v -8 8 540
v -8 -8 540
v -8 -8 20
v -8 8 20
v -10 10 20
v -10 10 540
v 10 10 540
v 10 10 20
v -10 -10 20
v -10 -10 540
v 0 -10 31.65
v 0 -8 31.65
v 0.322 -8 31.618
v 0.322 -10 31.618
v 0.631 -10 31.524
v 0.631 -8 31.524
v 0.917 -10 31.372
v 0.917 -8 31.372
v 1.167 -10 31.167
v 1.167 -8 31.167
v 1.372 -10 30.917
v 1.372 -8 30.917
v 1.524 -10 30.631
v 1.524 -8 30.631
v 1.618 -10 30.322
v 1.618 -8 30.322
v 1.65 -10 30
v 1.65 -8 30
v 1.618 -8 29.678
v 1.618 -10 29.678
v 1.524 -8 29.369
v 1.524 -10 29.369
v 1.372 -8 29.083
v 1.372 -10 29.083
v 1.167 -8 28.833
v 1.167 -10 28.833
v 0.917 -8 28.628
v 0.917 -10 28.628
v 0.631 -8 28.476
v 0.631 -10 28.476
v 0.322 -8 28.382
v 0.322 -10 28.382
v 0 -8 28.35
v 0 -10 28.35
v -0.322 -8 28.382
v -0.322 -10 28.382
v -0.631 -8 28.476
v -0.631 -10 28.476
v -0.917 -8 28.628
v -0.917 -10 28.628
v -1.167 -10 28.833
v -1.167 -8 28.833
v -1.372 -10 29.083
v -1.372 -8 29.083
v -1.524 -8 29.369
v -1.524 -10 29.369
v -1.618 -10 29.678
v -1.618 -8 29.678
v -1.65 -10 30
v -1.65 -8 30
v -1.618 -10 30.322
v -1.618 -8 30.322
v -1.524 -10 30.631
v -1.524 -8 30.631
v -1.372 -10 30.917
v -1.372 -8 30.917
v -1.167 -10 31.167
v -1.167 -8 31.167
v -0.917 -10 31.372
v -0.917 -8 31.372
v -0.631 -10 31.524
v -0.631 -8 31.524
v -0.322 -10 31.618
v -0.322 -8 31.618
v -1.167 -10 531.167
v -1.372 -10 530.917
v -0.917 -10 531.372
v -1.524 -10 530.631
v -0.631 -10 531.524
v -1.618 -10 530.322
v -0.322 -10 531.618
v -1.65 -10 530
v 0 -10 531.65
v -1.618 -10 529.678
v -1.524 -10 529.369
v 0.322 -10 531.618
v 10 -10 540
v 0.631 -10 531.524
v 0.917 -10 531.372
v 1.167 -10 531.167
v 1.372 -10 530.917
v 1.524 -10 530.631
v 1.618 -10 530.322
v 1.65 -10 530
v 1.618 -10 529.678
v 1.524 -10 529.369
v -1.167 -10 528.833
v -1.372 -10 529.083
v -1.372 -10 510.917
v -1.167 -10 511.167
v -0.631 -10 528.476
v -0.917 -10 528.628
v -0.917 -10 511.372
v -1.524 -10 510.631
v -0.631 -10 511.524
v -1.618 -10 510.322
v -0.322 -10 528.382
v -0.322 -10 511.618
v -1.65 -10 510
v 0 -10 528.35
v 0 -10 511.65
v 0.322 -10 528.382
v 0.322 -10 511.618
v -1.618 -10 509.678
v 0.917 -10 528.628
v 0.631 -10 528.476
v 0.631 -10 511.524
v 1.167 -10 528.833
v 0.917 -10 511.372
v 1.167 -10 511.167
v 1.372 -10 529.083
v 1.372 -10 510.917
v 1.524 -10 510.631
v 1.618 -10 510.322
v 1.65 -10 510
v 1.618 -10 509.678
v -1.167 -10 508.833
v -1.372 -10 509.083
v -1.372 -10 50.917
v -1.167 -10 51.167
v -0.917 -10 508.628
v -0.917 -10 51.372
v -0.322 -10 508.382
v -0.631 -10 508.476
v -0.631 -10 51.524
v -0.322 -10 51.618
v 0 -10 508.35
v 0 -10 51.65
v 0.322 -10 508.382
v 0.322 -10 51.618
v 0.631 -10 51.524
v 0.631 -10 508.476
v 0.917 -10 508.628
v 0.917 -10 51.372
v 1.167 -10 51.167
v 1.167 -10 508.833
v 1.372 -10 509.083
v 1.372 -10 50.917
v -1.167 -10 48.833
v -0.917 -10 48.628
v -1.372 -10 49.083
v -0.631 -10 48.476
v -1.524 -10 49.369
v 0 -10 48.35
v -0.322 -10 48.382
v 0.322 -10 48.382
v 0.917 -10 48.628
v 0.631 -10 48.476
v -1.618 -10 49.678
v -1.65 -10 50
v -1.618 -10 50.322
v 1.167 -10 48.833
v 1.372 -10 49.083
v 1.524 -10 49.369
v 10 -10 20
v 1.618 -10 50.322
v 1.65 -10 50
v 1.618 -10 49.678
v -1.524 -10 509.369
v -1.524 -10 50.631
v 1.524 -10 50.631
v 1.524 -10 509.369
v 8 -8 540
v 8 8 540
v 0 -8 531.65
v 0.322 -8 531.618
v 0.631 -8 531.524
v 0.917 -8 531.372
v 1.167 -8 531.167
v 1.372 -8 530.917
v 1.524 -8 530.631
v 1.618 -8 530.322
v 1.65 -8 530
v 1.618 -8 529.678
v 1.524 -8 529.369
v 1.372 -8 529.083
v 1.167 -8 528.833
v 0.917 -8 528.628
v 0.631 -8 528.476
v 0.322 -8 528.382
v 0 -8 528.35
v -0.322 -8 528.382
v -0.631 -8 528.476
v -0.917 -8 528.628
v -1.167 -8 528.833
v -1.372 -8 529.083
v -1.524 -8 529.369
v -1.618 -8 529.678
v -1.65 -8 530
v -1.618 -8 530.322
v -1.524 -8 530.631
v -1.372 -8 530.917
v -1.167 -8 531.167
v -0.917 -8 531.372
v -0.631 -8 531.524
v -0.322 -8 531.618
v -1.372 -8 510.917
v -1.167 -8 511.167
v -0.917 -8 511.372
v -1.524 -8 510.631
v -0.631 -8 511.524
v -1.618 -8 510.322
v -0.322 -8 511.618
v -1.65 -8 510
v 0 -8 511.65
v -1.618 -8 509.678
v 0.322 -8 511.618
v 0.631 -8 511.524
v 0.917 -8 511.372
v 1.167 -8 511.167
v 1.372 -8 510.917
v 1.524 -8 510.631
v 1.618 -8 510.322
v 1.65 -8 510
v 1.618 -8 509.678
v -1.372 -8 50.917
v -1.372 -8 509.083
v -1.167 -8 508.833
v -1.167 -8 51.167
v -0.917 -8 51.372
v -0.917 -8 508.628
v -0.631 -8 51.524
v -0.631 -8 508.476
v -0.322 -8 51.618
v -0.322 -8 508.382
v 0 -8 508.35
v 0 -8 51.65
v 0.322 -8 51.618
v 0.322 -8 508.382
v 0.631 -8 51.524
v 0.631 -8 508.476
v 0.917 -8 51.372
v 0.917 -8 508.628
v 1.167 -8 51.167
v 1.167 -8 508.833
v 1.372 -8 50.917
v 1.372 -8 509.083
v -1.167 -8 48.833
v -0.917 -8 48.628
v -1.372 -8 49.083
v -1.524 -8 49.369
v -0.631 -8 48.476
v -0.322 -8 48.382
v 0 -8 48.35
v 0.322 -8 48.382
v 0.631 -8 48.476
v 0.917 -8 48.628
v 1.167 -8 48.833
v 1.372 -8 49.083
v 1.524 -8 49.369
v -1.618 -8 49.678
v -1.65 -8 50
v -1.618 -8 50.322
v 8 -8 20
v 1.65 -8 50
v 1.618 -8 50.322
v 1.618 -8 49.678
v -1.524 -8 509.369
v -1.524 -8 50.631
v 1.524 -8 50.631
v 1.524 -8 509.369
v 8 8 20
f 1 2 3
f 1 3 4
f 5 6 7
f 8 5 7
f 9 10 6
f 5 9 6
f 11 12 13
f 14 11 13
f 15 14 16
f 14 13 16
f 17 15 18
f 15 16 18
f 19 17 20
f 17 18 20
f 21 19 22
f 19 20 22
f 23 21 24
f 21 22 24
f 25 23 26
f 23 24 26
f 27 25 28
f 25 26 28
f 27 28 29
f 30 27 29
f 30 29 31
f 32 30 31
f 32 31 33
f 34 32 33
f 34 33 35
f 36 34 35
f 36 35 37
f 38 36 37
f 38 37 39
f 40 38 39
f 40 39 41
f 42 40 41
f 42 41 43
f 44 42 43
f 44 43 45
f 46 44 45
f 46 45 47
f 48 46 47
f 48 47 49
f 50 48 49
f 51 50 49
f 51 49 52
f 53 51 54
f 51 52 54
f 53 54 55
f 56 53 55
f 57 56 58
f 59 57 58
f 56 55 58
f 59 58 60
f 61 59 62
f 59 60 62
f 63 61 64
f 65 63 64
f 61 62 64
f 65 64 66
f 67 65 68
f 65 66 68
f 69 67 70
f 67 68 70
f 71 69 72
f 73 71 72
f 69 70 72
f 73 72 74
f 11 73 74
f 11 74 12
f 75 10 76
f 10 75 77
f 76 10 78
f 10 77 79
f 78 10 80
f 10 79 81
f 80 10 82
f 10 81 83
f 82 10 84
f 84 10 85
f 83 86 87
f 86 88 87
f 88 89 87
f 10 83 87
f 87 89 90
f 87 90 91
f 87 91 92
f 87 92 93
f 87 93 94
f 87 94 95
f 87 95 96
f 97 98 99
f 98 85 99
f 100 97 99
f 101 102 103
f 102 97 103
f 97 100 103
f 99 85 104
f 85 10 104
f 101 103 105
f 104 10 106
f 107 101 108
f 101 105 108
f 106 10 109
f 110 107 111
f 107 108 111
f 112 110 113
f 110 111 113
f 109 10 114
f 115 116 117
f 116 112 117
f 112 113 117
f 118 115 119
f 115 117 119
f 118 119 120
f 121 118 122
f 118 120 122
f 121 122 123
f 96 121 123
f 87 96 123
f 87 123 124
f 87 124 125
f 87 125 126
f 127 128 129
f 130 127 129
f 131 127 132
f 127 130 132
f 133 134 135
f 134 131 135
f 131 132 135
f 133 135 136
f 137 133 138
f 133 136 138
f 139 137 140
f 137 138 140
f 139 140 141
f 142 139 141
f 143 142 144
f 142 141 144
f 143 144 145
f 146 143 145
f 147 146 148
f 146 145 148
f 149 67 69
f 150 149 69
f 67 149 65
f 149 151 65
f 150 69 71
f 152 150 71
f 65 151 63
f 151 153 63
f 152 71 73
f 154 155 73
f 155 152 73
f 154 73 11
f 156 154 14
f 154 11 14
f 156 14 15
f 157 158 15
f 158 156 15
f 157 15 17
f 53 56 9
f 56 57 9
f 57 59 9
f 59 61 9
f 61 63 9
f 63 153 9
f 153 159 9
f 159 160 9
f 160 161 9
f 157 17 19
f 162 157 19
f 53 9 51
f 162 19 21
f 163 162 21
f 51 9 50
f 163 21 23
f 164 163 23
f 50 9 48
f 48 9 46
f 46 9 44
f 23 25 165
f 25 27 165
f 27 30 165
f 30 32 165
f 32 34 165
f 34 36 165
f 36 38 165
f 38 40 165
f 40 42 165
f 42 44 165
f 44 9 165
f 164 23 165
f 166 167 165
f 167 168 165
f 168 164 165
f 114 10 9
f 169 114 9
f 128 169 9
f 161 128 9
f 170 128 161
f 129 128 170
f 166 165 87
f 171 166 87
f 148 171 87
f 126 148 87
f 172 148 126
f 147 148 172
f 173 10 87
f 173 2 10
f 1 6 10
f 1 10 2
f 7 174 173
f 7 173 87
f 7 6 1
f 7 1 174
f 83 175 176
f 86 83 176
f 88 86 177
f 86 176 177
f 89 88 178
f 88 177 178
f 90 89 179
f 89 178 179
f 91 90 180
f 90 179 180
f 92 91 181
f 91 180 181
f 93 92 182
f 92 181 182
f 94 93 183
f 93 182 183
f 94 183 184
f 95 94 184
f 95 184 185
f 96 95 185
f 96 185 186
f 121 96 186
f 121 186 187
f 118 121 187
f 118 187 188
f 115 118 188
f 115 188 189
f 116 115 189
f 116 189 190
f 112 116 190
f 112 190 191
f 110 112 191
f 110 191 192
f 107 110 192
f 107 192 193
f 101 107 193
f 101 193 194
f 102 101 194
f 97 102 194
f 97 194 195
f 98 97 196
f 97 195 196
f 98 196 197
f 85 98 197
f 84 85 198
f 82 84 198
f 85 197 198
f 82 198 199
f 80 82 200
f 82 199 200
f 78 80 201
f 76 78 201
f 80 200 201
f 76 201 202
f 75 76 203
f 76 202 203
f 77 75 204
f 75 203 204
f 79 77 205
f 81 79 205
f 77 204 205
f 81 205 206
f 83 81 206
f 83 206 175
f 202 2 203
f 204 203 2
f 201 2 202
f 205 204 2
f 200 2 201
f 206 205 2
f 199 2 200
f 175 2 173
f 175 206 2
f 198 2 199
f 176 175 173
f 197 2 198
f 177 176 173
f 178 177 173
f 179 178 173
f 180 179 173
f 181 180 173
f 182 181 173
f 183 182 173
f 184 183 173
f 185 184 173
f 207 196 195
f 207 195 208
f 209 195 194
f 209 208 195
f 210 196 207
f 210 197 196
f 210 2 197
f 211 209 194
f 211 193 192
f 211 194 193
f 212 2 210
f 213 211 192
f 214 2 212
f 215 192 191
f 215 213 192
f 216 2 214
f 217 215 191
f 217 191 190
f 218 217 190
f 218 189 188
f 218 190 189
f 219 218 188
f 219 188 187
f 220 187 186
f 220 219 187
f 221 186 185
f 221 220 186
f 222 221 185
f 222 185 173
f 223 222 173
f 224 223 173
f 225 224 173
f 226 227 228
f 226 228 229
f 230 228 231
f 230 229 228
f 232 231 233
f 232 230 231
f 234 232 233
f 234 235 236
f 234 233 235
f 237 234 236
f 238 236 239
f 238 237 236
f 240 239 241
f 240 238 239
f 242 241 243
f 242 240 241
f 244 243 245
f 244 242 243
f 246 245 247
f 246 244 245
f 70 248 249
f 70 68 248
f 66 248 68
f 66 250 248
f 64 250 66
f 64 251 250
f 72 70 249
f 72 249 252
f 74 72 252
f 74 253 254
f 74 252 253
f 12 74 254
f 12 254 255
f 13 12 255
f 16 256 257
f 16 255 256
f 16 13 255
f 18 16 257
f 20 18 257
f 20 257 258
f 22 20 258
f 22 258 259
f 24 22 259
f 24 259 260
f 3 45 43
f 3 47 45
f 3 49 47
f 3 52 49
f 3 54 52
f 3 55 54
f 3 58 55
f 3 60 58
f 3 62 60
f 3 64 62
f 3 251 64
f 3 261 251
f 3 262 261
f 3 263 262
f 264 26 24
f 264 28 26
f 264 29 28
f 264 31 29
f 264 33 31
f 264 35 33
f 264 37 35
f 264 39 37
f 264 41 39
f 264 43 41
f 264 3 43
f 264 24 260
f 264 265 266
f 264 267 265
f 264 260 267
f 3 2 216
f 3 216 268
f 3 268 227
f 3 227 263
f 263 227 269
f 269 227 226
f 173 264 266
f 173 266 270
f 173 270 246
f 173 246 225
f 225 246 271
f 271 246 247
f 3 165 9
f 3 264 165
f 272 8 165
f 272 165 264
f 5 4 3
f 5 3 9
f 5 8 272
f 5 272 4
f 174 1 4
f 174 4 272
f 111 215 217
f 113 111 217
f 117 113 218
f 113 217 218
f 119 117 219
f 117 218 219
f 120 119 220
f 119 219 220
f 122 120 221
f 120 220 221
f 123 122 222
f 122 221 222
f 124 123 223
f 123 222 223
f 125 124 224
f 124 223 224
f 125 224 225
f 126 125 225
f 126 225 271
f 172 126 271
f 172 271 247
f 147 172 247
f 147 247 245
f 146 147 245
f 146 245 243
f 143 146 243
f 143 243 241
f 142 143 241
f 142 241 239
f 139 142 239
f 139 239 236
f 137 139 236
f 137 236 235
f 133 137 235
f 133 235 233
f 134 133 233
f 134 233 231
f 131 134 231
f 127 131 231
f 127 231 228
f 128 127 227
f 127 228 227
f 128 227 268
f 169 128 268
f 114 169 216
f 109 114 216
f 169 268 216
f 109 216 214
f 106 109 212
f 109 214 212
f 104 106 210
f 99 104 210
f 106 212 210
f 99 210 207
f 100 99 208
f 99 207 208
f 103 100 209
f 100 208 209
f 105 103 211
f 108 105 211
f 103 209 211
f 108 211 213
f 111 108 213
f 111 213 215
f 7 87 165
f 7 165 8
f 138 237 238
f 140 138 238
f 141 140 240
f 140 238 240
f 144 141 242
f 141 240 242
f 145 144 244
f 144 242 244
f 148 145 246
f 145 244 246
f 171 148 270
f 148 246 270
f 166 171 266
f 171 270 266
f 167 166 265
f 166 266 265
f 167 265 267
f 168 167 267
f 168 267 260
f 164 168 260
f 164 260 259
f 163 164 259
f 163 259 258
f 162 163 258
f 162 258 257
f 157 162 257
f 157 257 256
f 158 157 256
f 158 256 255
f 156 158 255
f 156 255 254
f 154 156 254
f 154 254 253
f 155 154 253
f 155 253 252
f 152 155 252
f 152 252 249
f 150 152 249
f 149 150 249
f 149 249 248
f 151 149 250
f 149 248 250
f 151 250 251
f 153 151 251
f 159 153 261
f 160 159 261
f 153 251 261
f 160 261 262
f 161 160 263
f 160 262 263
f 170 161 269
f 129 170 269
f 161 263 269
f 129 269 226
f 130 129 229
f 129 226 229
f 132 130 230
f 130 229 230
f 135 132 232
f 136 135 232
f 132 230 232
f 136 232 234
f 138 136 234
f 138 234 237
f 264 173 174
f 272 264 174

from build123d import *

# Parameters (mm, degrees)
SKETCH_1_W          = 20
SKETCH_1_H          = 20
SKETCH_1_W_2        = 16
SKETCH_1_H_2        = 16
EXTRUDE_1_DEPTH     = 560
SKETCH_4_R          = 2.2
CUT_EXTRUDE_3_DEPTH = 560
SKETCH_5_W          = 20
SKETCH_5_H          = 20
SKETCH_5_W_2        = 16
SKETCH_5_H_2        = 16
EXTRUDE_2_DEPTH     = 20
SKETCH_6_W          = 20
SKETCH_6_H          = 20
SKETCH_6_W_2        = 16
SKETCH_6_H_2        = 16
EXTRUDE_3_DEPTH     = 20
SKETCH_8_R          = 2.2
CUT_EXTRUDE_4_DEPTH = 20
SKETCH_9_R          = 2.2
CUT_EXTRUDE_5_DEPTH = 20
SKETCH_10_W         = 51.42245882
SKETCH_10_H         = 30.440795882
CUT_EXTRUDE_6_DEPTH = 40
SKETCH_11_W         = 39.362638682
SKETCH_11_H         = 52.74733359
CUT_EXTRUDE_7_DEPTH = 40
SKETCH_12_R         = 1
CUT_EXTRUDE_8_DEPTH = 10
SKETCH_13_R         = 1
CUT_EXTRUDE_9_DEPTH = 10
M4X0_7_1_D          = 3.3
M4X0_7_1_DEPTH      = 11.5
M4X0_7_1_TIP        = 0.991420021


with BuildPart() as part:
    # ｽｹｯﾁ1 → ﾎﾞｽ - 押し出し1 (new body)
    with BuildSketch(Plane.XY):
        Rectangle(SKETCH_1_W, SKETCH_1_H)
        Rectangle(SKETCH_1_W_2, SKETCH_1_H_2, mode=Mode.SUBTRACT)
    extrude(amount=EXTRUDE_1_DEPTH)

    # ｽｹｯﾁ4 → ｶｯﾄ - 押し出し3 (cut)
    with BuildSketch(Plane(origin=(0, 10, 0), x_dir=(1, 0, 0), z_dir=(0, 1, 0))):
        with Locations((0, -550)):
            Circle(SKETCH_4_R)
        with Locations((0, -10)):
            Circle(SKETCH_4_R)
    extrude(amount=-CUT_EXTRUDE_3_DEPTH, mode=Mode.SUBTRACT)

    # ｽｹｯﾁ5 → ﾎﾞｽ - 押し出し2 (add)
    with BuildSketch(Plane(origin=(0, 0, 0), x_dir=(-1, 0, 0), z_dir=(0, 0, -1))):
        Rectangle(SKETCH_5_W, SKETCH_5_H)
        Rectangle(SKETCH_5_W_2, SKETCH_5_H_2, mode=Mode.SUBTRACT)
    extrude(amount=EXTRUDE_2_DEPTH)

    # ｽｹｯﾁ6 → ﾎﾞｽ - 押し出し3 (add)
    with BuildSketch(Plane.XY.offset(560)):
        Rectangle(SKETCH_6_W, SKETCH_6_H)
        Rectangle(SKETCH_6_W_2, SKETCH_6_H_2, mode=Mode.SUBTRACT)
    extrude(amount=EXTRUDE_3_DEPTH)

    # ｽｹｯﾁ8 → ｶｯﾄ - 押し出し4 (cut)
    with BuildSketch(Plane(origin=(10, 0, 0), x_dir=(0, 0, -1), z_dir=(1, 0, 0))):
        with Locations((-570, 0)):
            Circle(SKETCH_8_R)
    extrude(amount=-CUT_EXTRUDE_4_DEPTH, mode=Mode.SUBTRACT)

    # ｽｹｯﾁ9 → ｶｯﾄ - 押し出し5 (cut)
    with BuildSketch(Plane(origin=(10, 0, 0), x_dir=(0, 0, -1), z_dir=(1, 0, 0))):
        with Locations((10, 0)):
            Circle(SKETCH_9_R)
    extrude(amount=-CUT_EXTRUDE_5_DEPTH, mode=Mode.SUBTRACT)

    # ｽｹｯﾁ10 → ｶｯﾄ - 押し出し6 (cut)
    with BuildSketch(Plane(origin=(0, 0, -20), x_dir=(-1, 0, 0), z_dir=(0, 0, -1))):
        Rectangle(SKETCH_10_W, SKETCH_10_H)
    extrude(amount=-CUT_EXTRUDE_6_DEPTH, mode=Mode.SUBTRACT)

    # ｽｹｯﾁ11 → ｶｯﾄ - 押し出し7 (cut)
    with BuildSketch(Plane.XY.offset(580)):
        Rectangle(SKETCH_11_W, SKETCH_11_H)
    extrude(amount=-CUT_EXTRUDE_7_DEPTH, mode=Mode.SUBTRACT)

    # ｽｹｯﾁ12 → ｶｯﾄ - 押し出し8 (cut)
    with BuildSketch(Plane(origin=(0, -10, 0), x_dir=(-1, 0, 0), z_dir=(0, -1, 0))):
        with Locations((0, -530)):
            Circle(SKETCH_12_R)
        with Locations((0, -510)):
            Circle(SKETCH_12_R)
    extrude(amount=-CUT_EXTRUDE_8_DEPTH, mode=Mode.SUBTRACT)

    # ｽｹｯﾁ13 → ｶｯﾄ - 押し出し9 (cut)
    with BuildSketch(Plane(origin=(0, -10, 0), x_dir=(-1, 0, 0), z_dir=(0, -1, 0))):
        with Locations((0, -30)):
            Circle(SKETCH_13_R)
        with Locations((0, -50)):
            Circle(SKETCH_13_R)
    extrude(amount=-CUT_EXTRUDE_9_DEPTH, mode=Mode.SUBTRACT)

    # M4x0.7 ねじ穴1
    with Locations(Plane(origin=(0, -10, 30), x_dir=(0, 0, -1), z_dir=(0, -1, 0))):
        with Locations((0, 0), (-20, 0), (-480, 0), (-500, 0)):
            Hole(M4X0_7_1_D / 2, depth=M4X0_7_1_DEPTH)
            with Locations((0, 0, -(M4X0_7_1_DEPTH + M4X0_7_1_TIP / 2))):  # 118° drill point
                Cone(0, M4X0_7_1_D / 2, M4X0_7_1_TIP, mode=Mode.SUBTRACT)


solid = part.part
